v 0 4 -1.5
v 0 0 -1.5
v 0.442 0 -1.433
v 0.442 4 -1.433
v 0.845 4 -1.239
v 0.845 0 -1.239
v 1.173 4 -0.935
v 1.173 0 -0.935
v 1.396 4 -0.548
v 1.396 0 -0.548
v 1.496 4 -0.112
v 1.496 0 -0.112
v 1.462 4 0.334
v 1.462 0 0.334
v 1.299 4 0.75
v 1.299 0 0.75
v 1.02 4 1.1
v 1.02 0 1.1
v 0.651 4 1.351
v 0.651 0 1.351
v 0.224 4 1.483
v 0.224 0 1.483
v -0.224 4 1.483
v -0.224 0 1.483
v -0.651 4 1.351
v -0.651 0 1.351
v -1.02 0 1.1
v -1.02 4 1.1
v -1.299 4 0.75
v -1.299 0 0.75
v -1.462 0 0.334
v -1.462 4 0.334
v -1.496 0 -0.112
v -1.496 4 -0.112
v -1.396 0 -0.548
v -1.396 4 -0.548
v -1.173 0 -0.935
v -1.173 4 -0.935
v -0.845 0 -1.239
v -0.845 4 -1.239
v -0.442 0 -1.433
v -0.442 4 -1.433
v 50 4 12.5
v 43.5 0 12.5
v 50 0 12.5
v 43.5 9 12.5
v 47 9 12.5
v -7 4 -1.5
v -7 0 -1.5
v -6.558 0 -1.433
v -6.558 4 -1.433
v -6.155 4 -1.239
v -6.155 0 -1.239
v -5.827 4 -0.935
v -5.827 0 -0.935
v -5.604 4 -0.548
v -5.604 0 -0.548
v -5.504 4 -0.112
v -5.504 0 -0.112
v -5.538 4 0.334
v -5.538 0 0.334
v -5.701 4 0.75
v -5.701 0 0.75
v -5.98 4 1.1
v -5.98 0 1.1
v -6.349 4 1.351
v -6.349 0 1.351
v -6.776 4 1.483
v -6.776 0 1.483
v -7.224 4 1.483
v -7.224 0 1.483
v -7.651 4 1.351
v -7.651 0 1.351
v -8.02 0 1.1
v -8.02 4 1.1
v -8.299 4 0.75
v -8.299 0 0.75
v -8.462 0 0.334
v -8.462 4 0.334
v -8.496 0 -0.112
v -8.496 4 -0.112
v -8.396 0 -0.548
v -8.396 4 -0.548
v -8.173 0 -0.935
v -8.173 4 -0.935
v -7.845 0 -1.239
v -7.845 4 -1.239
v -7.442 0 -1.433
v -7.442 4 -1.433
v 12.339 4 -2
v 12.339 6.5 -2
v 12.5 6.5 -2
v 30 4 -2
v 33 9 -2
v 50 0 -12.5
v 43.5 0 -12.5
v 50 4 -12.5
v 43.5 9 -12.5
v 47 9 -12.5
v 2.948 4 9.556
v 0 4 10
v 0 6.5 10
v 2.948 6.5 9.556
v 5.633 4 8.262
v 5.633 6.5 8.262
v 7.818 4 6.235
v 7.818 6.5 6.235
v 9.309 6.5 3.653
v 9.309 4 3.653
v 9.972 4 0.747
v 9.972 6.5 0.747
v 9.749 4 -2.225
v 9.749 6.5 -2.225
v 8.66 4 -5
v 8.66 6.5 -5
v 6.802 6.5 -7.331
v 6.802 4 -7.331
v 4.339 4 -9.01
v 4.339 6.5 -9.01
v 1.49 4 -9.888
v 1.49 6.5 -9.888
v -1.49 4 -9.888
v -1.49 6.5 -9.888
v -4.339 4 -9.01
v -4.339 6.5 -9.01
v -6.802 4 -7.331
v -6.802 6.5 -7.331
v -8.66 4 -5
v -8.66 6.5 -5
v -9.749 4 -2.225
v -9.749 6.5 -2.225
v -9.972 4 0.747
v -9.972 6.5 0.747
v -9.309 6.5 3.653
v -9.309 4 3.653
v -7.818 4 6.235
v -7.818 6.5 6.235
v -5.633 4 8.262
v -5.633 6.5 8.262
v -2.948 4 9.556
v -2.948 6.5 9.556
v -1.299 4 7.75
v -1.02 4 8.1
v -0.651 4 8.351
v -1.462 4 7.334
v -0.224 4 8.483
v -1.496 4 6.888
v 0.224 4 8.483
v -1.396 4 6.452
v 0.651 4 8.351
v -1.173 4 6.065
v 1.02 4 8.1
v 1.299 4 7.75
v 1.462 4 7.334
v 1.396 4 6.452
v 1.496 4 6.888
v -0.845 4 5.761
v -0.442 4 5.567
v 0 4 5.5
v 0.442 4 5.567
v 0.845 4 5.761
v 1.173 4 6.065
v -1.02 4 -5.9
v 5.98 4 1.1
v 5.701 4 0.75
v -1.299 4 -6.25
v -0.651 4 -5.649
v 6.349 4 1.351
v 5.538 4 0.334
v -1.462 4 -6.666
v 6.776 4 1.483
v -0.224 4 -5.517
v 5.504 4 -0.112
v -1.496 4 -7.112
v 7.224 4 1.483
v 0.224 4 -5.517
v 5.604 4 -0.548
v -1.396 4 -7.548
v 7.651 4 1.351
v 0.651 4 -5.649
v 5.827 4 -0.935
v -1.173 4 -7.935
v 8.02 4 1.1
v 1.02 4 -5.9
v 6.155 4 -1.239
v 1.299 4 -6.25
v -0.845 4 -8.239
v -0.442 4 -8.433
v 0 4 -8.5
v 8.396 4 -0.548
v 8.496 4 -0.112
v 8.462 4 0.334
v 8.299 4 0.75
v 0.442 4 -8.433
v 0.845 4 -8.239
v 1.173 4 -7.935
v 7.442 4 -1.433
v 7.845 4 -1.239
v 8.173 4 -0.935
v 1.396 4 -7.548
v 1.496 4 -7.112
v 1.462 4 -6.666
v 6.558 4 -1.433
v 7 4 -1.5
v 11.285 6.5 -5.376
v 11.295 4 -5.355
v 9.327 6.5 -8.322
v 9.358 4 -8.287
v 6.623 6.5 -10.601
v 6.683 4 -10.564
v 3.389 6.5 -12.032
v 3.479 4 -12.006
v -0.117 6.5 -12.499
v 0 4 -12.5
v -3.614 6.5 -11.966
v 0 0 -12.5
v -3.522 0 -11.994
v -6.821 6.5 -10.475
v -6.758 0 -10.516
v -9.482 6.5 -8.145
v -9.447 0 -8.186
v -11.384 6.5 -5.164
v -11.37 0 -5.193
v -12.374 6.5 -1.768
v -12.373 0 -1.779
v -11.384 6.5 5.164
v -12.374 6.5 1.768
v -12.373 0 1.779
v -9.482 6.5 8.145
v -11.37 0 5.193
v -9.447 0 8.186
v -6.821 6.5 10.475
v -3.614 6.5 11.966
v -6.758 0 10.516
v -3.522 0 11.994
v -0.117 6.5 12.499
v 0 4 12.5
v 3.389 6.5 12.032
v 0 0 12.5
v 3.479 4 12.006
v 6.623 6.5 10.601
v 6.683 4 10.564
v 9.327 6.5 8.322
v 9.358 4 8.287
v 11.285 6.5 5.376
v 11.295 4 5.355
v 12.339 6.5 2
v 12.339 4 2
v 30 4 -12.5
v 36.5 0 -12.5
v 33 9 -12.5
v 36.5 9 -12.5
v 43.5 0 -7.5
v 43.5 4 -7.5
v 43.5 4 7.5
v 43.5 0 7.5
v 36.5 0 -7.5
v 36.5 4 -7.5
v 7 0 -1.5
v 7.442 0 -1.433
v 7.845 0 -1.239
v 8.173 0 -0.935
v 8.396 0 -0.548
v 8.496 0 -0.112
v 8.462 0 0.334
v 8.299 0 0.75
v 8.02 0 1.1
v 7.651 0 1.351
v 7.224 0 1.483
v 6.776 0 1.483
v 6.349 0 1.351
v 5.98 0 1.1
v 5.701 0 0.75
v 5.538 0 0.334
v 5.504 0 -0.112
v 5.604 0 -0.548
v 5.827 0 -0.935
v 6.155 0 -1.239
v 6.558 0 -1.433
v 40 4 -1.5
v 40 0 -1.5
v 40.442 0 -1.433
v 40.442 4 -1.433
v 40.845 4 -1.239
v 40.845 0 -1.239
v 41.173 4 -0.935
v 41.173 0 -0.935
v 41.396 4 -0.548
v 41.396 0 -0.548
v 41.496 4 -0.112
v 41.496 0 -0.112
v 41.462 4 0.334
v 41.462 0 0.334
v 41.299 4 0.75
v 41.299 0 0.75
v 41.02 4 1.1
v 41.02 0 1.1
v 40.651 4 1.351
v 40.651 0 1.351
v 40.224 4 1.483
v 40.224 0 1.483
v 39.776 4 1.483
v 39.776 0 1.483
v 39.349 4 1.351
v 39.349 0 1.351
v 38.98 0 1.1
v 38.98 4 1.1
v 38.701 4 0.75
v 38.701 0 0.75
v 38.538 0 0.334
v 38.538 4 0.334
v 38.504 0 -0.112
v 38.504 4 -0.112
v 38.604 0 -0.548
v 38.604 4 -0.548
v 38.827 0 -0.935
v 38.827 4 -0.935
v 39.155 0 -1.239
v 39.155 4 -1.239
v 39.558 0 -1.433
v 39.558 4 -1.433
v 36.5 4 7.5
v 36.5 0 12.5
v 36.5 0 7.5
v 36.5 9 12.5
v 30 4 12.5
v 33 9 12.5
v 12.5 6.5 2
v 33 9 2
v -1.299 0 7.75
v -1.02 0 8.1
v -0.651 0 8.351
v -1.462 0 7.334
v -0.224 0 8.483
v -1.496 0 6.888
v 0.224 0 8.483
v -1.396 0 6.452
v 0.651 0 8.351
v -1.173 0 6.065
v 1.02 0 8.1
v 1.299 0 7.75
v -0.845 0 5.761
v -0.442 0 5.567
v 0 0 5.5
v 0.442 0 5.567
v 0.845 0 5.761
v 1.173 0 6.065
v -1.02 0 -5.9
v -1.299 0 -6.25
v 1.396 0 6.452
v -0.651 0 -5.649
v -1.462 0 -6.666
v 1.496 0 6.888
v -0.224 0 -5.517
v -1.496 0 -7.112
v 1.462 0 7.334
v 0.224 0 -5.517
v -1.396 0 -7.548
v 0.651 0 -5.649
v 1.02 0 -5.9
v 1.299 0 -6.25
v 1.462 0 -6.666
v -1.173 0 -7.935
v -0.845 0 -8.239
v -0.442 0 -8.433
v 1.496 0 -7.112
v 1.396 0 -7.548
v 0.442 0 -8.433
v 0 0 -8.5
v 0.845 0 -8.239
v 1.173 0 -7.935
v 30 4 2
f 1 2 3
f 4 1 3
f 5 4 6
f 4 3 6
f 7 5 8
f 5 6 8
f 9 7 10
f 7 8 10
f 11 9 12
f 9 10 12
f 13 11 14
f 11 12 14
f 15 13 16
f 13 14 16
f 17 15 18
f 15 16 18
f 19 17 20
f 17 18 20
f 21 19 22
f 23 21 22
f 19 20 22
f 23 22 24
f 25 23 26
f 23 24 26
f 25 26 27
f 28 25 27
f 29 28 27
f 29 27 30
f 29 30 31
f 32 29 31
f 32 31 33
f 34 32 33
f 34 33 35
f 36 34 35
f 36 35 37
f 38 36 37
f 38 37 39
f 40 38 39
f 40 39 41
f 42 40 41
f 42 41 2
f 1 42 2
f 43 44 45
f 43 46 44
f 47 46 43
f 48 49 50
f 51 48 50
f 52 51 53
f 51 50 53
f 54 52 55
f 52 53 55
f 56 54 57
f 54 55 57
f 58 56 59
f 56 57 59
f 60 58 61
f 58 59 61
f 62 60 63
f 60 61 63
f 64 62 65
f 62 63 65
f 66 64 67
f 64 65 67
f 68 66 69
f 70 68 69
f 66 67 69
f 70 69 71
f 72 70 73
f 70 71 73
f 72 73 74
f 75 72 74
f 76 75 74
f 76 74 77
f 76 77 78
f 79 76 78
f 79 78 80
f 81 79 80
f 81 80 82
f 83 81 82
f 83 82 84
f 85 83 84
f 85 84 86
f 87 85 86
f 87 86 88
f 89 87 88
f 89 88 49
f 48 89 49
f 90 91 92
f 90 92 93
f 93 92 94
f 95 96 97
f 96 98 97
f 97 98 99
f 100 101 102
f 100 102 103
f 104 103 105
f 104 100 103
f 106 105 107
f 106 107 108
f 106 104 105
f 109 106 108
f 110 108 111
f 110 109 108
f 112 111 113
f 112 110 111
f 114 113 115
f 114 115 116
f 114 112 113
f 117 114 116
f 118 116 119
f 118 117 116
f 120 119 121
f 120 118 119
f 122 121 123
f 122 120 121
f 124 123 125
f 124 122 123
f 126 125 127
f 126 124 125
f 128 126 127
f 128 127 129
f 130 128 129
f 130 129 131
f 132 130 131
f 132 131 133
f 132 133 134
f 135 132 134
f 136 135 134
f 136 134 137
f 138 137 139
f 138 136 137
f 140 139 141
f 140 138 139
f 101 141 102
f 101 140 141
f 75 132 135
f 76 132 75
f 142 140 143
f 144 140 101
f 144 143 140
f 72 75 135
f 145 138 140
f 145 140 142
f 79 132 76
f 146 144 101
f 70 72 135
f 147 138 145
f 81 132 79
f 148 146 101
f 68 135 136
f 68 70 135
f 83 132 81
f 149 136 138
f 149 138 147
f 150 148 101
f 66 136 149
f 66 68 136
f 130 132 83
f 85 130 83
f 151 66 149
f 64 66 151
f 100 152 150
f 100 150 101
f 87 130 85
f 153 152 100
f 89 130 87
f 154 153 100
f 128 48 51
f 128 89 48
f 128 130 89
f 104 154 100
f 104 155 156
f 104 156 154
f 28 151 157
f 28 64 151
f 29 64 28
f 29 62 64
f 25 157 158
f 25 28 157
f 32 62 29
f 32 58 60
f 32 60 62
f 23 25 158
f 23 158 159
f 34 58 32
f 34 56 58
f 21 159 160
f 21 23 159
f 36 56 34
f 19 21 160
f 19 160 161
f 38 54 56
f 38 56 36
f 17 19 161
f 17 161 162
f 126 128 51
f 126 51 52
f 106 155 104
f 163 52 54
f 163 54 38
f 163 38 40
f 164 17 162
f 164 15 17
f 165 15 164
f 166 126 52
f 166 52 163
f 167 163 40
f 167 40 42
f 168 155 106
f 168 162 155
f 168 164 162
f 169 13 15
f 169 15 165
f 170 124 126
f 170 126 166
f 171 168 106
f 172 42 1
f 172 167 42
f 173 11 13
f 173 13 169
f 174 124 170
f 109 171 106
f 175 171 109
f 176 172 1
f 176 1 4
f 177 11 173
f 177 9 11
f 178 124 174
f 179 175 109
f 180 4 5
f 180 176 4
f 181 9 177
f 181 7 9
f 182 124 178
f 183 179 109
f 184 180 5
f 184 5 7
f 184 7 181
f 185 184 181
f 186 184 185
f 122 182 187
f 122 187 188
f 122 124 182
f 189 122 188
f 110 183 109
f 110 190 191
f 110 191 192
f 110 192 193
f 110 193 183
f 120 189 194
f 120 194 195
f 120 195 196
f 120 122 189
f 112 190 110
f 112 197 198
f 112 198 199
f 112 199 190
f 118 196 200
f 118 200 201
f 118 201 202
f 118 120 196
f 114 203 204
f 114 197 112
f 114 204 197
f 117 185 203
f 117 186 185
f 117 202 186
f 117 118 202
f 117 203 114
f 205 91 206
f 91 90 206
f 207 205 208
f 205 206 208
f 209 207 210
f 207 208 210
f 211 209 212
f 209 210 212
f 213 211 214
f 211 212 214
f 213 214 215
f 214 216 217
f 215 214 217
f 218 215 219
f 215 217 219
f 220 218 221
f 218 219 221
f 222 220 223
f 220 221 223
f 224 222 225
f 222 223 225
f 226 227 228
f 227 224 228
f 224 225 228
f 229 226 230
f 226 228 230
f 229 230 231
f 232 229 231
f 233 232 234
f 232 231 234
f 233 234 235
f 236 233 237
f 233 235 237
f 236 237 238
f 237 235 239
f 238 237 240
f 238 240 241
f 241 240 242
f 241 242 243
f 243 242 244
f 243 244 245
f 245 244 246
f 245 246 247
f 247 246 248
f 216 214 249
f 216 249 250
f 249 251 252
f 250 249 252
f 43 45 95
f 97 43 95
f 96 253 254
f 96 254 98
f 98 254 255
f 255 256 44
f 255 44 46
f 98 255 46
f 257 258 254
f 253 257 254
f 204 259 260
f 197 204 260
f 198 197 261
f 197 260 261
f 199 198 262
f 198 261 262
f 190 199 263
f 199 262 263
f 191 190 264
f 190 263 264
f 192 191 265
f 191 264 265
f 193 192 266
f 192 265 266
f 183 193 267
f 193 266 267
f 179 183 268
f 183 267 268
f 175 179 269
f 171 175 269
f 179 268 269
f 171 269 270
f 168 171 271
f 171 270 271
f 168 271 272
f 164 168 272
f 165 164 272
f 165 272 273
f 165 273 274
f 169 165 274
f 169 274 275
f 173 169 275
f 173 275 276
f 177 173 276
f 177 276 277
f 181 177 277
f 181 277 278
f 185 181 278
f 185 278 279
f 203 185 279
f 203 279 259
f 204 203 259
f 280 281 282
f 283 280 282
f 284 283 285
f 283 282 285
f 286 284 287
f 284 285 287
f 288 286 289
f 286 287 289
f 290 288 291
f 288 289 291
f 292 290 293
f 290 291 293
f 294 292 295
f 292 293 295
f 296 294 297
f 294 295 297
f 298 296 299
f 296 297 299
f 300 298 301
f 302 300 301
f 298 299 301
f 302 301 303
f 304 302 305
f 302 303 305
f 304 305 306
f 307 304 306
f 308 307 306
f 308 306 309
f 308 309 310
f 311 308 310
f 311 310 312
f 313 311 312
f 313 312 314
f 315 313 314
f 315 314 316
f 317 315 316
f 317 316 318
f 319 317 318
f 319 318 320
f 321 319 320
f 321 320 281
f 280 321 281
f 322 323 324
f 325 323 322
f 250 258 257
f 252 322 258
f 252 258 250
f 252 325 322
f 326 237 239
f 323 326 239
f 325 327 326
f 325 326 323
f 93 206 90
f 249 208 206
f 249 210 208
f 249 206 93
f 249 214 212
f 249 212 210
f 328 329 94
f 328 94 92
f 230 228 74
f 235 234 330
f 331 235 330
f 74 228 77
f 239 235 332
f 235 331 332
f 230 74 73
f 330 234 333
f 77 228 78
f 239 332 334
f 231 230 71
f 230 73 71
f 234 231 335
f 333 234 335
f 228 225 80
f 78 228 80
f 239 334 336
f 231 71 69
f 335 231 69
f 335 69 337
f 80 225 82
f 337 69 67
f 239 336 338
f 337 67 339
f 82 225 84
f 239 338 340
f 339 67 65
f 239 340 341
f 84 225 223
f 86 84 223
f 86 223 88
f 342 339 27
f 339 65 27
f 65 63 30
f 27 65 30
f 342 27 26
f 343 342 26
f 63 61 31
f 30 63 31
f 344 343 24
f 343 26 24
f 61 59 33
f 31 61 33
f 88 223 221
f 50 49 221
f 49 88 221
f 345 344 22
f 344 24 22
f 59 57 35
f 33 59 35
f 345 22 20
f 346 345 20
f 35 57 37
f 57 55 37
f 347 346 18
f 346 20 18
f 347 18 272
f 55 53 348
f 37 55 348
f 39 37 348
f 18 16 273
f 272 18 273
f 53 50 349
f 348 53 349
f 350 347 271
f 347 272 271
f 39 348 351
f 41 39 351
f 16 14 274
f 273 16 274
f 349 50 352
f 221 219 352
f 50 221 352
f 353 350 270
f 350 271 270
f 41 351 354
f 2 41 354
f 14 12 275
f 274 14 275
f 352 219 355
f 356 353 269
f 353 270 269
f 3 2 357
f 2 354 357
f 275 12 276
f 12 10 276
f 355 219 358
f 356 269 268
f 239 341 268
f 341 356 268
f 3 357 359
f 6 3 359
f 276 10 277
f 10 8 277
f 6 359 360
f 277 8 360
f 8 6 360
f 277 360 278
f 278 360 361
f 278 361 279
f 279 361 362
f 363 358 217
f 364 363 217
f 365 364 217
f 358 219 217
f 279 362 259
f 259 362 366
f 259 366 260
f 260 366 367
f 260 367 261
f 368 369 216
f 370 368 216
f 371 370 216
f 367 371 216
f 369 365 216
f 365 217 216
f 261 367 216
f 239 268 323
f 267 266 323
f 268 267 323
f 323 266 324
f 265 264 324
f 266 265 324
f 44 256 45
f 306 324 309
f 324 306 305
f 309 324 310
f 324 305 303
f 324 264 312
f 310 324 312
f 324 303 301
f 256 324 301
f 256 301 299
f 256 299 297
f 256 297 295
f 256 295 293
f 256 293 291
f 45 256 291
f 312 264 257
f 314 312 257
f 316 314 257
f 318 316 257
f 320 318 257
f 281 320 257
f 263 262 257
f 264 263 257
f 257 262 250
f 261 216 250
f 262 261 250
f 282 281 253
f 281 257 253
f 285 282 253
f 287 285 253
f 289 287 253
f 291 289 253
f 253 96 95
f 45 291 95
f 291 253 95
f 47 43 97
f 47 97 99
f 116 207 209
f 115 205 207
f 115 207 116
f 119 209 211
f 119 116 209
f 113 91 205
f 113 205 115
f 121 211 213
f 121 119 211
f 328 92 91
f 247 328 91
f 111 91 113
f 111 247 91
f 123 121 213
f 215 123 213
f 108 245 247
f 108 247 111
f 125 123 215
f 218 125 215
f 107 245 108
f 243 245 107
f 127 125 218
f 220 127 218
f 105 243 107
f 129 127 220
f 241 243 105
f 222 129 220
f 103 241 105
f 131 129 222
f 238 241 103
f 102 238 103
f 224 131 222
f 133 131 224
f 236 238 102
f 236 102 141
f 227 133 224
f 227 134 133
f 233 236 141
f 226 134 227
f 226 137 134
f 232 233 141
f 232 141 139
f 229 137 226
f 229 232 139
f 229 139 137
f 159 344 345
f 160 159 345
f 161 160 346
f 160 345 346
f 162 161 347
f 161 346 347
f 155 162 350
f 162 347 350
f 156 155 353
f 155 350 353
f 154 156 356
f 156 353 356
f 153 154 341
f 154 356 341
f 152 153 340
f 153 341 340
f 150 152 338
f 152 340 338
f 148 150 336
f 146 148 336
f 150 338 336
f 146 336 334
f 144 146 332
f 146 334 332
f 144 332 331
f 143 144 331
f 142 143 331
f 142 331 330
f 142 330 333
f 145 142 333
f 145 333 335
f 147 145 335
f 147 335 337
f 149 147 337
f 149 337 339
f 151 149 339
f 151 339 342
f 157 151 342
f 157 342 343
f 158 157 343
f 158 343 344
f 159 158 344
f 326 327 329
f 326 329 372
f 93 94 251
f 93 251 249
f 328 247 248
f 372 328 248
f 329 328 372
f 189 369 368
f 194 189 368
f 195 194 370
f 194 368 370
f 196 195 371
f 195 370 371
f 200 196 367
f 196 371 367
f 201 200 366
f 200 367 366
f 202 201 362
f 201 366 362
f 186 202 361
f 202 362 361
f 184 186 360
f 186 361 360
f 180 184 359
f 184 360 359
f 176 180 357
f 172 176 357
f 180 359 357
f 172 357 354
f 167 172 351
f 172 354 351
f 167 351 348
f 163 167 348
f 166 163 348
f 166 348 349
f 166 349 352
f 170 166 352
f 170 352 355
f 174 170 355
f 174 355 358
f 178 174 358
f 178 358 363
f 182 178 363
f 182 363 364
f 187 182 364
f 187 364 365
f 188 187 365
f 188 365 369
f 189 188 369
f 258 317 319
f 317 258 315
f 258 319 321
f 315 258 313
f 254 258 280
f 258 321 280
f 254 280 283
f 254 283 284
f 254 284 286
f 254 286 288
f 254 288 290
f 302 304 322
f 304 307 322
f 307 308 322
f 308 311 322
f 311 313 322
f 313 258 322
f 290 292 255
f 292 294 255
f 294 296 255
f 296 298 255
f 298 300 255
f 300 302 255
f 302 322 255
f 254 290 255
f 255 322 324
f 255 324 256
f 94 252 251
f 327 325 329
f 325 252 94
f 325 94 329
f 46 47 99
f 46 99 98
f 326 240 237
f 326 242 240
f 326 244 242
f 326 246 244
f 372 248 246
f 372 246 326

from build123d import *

# Parameters (mm, degrees)
SKETCH_1_R          = 12.5
EXTRUDE_1_DEPTH     = 4
SKETCH_2_R          = 12.5
SKETCH_2_R_2        = 10
EXTRUDE_2_DEPTH     = 2.5
SKETCH_3_R          = 1.5
CUT_EXTRUDE_1_DEPTH = 52.947088465
EXTRUDE_3_DEPTH     = 25
SKETCH_5_W          = 7
SKETCH_5_H          = 5
CUT_EXTRUDE_2_DEPTH = 57.621550668
SKETCH_6_W          = 7
SKETCH_6_H          = 5
CUT_EXTRUDE_3_DEPTH = 52.780787943
EXTRUDE_6_DEPTH     = 2


with BuildPart() as part:
    # 草图1 → 凸台-拉伸1 (new body)
    with BuildSketch(Plane(origin=(0, 0, 0), x_dir=(1, 0, 0), z_dir=(0, 1, 0))):
        Circle(SKETCH_1_R)
        with BuildLine():
            Line((50, 12.5), (0, 12.5))
            ThreePointArc((0, 12.5), (8.838834765, 8.838834765), (12.5, 0))
            ThreePointArc((12.5, 0), (8.838834765, -8.838834765), (0, -12.5))
            Line((0, -12.5), (50, -12.5))
            Line((50, -12.5), (50, 12.5))
        make_face()
    extrude(amount=EXTRUDE_1_DEPTH)

    # 草图2 → 凸台-拉伸2 (add)
    with BuildSketch(Plane(origin=(0, 4, 0), x_dir=(1, 0, 0), z_dir=(0, 1, 0))):
        with Locations(Location((0, 0, 0), (0, 0, 270))):
            Circle(SKETCH_2_R)
        with Locations(Location((0, 0, 0), (0, 0, 270))):
            Circle(SKETCH_2_R_2, mode=Mode.SUBTRACT)
    extrude(amount=EXTRUDE_2_DEPTH)

    # 草图3 → 切除-拉伸1 (cut, through all)
    with BuildSketch(Plane.XZ):
        with Locations(Location((0, 0, 0), (0, 0, 270))):
            Circle(SKETCH_3_R)
        with Locations(Location((0, 7, 0), (0, 0, 270))):
            Circle(SKETCH_3_R)
        with Locations(Location((7, 0, 0), (0, 0, 270))):
            Circle(SKETCH_3_R)
        with Locations(Location((0, -7, 0), (0, 0, 270))):
            Circle(SKETCH_3_R)
        with Locations(Location((-7, 0, 0), (0, 0, 270))):
            Circle(SKETCH_3_R)
        with Locations(Location((40, 0, 0), (0, 0, 270))):
            Circle(SKETCH_3_R)
    extrude(amount=-CUT_EXTRUDE_1_DEPTH, mode=Mode.SUBTRACT)

    # 草图4 → 凸台-拉伸3 (add)
    with BuildSketch(Plane.XY.offset(12.5)):
        Polygon((50, 4), (47, 9), (33, 9), (30, 4), align=None)
    extrude(amount=-EXTRUDE_3_DEPTH)

    # 草图5 → 切除-拉伸2 (cut, through all)
    with BuildSketch(Plane.XY.offset(12.5)):
        with Locations((40, 6.5)):
            Rectangle(SKETCH_5_W, SKETCH_5_H)
    extrude(amount=-CUT_EXTRUDE_2_DEPTH, mode=Mode.SUBTRACT)

    # 草图6 → 切除-拉伸3 (cut, through all)
    with BuildSketch(Plane(origin=(0, 4, 0), x_dir=(1, 0, 0), z_dir=(0, 1, 0))):
        with Locations((40, -10)):
            Rectangle(SKETCH_6_W, SKETCH_6_H)
        with Locations((40, 10)):
            Rectangle(SKETCH_6_W, SKETCH_6_H)
    extrude(amount=-CUT_EXTRUDE_3_DEPTH, mode=Mode.SUBTRACT)

    # 草图7 → 凸台-拉伸6 (add, symmetric)
    with BuildSketch(Plane.XY):
        Polygon((30, 4), (33, 9), (12.5, 6.5), (10.351420614, 6.5), (10.351420614, 4), align=None)
    extrude(amount=EXTRUDE_6_DEPTH, both=True)


solid = part.part
